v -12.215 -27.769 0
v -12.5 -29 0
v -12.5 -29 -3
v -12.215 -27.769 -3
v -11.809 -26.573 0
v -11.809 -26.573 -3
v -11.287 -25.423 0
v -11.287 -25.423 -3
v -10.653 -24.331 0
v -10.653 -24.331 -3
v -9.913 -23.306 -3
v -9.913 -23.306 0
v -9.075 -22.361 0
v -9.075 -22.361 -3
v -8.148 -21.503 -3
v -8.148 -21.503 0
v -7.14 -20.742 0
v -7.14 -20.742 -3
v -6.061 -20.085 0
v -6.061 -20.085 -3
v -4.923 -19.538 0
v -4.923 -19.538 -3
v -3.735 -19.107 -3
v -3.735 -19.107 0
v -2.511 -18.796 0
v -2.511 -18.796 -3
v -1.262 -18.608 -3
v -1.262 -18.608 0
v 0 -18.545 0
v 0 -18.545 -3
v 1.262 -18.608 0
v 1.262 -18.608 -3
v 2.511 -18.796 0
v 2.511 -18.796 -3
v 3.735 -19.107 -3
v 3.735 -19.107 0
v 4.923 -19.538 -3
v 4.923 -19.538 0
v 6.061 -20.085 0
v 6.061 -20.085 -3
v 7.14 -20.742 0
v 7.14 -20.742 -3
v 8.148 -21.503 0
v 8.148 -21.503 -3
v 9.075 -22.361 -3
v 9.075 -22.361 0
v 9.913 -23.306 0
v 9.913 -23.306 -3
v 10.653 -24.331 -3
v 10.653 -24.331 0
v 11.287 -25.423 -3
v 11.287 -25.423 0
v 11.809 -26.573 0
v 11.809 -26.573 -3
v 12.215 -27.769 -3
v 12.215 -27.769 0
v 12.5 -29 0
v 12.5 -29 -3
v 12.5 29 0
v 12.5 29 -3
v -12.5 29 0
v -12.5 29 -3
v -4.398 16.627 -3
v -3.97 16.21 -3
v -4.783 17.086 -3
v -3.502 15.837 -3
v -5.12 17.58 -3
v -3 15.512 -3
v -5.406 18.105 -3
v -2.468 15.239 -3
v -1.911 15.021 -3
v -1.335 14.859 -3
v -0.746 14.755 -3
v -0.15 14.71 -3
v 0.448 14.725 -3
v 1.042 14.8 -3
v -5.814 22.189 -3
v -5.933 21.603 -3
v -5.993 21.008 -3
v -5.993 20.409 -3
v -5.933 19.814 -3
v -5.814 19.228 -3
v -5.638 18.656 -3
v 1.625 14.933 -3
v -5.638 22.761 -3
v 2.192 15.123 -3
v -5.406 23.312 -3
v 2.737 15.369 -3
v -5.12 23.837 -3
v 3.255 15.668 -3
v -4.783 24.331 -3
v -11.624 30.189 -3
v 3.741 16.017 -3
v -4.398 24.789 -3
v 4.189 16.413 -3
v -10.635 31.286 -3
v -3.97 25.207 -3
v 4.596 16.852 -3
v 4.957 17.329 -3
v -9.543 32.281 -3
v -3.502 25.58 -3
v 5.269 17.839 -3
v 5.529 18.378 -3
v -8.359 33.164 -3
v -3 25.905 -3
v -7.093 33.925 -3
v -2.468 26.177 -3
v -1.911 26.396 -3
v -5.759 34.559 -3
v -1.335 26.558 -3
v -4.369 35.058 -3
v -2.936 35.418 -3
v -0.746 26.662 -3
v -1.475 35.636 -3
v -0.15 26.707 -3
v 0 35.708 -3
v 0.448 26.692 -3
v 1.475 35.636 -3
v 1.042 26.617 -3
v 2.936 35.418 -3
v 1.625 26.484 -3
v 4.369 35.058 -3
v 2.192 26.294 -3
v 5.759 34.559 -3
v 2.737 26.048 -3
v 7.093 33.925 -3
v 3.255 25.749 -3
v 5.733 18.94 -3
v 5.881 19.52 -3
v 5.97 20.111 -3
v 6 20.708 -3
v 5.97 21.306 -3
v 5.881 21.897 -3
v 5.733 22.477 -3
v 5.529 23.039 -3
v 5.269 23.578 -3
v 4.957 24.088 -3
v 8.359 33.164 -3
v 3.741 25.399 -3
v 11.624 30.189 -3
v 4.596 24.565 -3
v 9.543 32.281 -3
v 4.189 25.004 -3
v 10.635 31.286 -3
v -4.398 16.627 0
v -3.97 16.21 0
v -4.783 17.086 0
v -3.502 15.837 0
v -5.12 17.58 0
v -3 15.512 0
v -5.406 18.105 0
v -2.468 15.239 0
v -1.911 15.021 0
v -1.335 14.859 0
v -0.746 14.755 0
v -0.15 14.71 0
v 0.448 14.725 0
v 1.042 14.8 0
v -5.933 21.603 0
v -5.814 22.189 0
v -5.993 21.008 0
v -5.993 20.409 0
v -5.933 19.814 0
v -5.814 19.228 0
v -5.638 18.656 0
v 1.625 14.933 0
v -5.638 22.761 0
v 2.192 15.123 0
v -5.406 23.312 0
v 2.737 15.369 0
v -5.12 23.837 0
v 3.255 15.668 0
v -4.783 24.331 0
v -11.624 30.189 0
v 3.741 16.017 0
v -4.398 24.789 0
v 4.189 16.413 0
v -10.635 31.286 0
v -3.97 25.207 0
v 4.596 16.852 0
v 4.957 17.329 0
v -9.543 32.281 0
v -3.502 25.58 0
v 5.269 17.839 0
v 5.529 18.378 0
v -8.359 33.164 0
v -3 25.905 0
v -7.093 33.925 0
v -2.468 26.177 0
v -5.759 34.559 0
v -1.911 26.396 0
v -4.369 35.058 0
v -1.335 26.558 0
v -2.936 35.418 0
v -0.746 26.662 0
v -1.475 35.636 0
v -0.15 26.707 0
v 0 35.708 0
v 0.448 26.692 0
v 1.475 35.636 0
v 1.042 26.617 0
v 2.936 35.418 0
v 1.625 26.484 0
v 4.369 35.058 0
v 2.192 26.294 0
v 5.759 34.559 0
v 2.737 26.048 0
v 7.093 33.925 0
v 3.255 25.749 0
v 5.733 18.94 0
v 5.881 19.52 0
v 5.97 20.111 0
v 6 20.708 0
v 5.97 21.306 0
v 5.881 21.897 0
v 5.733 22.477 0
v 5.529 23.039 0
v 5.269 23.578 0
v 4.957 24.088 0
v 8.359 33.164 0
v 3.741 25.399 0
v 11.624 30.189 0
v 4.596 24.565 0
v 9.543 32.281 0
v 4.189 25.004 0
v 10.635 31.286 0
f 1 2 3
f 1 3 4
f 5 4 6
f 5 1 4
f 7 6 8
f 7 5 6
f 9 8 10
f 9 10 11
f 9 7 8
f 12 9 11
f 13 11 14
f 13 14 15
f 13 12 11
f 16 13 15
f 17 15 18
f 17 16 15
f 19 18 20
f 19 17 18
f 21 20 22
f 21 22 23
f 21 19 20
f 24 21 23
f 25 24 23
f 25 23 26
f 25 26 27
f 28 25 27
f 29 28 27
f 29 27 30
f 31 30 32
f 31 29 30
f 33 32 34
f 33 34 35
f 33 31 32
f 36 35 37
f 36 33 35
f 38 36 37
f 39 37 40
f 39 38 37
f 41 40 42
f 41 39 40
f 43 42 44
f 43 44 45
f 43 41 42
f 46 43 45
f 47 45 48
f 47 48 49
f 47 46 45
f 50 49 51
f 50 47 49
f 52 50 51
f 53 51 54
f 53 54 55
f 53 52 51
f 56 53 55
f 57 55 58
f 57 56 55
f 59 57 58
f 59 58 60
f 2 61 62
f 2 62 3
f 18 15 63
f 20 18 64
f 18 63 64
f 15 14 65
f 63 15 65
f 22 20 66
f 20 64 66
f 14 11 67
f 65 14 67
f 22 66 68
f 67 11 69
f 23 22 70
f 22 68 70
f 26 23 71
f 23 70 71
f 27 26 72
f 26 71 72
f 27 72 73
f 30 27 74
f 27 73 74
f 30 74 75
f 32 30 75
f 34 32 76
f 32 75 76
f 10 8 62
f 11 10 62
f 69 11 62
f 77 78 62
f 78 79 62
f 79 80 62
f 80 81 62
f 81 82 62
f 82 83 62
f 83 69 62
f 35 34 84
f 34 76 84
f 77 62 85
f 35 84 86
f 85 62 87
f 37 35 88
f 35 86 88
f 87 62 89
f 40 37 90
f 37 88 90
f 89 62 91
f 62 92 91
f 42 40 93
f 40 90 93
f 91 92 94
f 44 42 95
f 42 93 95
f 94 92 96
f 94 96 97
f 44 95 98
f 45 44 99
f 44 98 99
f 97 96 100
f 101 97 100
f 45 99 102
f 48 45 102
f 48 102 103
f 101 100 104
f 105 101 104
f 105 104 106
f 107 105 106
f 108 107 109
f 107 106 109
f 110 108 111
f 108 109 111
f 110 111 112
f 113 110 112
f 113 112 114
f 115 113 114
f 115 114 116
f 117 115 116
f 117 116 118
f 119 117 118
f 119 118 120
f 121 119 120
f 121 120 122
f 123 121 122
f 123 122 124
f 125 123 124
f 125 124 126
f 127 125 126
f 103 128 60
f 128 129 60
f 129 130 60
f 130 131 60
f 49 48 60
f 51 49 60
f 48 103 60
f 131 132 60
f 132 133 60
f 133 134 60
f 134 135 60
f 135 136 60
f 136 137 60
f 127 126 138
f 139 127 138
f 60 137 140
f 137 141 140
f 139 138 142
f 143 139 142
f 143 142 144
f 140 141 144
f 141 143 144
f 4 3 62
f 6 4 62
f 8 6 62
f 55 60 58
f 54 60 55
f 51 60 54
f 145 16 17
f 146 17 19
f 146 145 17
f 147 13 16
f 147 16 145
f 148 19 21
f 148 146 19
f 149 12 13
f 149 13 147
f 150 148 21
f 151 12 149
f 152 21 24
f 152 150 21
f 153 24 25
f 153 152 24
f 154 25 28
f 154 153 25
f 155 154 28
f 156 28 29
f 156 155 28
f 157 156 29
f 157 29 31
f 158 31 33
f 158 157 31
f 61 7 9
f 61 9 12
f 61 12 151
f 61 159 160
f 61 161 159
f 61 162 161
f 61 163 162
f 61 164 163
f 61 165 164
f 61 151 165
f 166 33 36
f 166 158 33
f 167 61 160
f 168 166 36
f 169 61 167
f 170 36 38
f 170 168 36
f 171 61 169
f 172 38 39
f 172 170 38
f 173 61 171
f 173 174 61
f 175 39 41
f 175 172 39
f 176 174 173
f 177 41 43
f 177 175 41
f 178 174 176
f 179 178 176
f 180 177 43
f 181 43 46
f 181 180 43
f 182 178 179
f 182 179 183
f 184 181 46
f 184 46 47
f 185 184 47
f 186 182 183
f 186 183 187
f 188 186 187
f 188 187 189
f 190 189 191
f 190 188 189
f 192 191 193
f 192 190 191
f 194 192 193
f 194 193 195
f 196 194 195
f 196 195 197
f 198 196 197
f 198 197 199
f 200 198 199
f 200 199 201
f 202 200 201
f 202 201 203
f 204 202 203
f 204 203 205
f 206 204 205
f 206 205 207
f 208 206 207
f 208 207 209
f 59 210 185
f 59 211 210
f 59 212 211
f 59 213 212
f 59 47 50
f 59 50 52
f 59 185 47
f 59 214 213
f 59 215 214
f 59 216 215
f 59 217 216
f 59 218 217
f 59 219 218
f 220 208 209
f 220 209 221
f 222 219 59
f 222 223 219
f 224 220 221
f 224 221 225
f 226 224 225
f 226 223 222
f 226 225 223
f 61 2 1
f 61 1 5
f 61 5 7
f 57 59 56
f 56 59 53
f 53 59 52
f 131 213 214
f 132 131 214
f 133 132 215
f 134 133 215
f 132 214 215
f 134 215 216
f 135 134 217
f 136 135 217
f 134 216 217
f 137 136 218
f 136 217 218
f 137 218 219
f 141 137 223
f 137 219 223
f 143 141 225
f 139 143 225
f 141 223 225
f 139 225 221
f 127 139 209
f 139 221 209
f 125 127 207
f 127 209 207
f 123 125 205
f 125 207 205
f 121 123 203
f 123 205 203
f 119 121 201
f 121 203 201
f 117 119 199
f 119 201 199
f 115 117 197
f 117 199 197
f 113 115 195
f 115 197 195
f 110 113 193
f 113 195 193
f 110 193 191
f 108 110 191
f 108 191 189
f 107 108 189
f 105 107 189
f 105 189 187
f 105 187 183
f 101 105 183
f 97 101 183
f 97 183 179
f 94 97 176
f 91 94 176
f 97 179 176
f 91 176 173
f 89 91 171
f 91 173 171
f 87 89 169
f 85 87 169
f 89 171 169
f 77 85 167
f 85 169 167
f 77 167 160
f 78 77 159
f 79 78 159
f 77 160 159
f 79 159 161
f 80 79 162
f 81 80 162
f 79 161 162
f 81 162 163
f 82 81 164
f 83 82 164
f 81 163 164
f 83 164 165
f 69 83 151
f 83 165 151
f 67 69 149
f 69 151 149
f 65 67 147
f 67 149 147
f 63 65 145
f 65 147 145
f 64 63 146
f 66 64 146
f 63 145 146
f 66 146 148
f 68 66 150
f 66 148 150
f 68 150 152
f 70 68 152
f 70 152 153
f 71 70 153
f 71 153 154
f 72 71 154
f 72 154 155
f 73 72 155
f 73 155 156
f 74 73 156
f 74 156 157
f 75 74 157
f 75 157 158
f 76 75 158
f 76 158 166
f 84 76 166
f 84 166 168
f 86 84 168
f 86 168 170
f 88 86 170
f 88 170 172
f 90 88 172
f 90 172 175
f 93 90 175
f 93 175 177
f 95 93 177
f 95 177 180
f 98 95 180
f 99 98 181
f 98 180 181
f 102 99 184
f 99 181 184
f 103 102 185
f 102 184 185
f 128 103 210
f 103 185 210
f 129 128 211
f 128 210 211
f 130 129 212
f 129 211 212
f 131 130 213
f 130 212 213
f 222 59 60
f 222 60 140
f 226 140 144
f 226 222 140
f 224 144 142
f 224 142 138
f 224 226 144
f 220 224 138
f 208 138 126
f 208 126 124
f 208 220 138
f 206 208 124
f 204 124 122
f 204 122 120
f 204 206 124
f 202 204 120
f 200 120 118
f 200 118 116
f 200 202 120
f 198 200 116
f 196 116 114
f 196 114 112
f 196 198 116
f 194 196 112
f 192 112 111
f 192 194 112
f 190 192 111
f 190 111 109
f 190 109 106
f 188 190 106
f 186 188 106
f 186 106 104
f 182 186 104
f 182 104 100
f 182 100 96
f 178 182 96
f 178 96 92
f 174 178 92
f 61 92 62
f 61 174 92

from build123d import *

# Parameters (mm, degrees)
SKETCH1_R          = 6
BASE_FLANGE1_DEPTH = 3


# Sheet-metal steps are written as plain solids
with BuildPart() as part:
    # Sketch1 → Base-Flange1 (new body)
    with BuildSketch(Plane.XY):
        with BuildLine():
            Line((-12.5, 29), (-12.5, -29))
            ThreePointArc((-12.5, -29), (0, -18.544994432), (12.5, -29))
            Line((12.5, -29), (12.5, 29))
            ThreePointArc((12.5, 29), (0, 35.708438024), (-12.5, 29))
        make_face()
        with Locations((0, 20.708438024)):
            Circle(SKETCH1_R, mode=Mode.SUBTRACT)
    extrude(amount=-BASE_FLANGE1_DEPTH)


solid = part.part
